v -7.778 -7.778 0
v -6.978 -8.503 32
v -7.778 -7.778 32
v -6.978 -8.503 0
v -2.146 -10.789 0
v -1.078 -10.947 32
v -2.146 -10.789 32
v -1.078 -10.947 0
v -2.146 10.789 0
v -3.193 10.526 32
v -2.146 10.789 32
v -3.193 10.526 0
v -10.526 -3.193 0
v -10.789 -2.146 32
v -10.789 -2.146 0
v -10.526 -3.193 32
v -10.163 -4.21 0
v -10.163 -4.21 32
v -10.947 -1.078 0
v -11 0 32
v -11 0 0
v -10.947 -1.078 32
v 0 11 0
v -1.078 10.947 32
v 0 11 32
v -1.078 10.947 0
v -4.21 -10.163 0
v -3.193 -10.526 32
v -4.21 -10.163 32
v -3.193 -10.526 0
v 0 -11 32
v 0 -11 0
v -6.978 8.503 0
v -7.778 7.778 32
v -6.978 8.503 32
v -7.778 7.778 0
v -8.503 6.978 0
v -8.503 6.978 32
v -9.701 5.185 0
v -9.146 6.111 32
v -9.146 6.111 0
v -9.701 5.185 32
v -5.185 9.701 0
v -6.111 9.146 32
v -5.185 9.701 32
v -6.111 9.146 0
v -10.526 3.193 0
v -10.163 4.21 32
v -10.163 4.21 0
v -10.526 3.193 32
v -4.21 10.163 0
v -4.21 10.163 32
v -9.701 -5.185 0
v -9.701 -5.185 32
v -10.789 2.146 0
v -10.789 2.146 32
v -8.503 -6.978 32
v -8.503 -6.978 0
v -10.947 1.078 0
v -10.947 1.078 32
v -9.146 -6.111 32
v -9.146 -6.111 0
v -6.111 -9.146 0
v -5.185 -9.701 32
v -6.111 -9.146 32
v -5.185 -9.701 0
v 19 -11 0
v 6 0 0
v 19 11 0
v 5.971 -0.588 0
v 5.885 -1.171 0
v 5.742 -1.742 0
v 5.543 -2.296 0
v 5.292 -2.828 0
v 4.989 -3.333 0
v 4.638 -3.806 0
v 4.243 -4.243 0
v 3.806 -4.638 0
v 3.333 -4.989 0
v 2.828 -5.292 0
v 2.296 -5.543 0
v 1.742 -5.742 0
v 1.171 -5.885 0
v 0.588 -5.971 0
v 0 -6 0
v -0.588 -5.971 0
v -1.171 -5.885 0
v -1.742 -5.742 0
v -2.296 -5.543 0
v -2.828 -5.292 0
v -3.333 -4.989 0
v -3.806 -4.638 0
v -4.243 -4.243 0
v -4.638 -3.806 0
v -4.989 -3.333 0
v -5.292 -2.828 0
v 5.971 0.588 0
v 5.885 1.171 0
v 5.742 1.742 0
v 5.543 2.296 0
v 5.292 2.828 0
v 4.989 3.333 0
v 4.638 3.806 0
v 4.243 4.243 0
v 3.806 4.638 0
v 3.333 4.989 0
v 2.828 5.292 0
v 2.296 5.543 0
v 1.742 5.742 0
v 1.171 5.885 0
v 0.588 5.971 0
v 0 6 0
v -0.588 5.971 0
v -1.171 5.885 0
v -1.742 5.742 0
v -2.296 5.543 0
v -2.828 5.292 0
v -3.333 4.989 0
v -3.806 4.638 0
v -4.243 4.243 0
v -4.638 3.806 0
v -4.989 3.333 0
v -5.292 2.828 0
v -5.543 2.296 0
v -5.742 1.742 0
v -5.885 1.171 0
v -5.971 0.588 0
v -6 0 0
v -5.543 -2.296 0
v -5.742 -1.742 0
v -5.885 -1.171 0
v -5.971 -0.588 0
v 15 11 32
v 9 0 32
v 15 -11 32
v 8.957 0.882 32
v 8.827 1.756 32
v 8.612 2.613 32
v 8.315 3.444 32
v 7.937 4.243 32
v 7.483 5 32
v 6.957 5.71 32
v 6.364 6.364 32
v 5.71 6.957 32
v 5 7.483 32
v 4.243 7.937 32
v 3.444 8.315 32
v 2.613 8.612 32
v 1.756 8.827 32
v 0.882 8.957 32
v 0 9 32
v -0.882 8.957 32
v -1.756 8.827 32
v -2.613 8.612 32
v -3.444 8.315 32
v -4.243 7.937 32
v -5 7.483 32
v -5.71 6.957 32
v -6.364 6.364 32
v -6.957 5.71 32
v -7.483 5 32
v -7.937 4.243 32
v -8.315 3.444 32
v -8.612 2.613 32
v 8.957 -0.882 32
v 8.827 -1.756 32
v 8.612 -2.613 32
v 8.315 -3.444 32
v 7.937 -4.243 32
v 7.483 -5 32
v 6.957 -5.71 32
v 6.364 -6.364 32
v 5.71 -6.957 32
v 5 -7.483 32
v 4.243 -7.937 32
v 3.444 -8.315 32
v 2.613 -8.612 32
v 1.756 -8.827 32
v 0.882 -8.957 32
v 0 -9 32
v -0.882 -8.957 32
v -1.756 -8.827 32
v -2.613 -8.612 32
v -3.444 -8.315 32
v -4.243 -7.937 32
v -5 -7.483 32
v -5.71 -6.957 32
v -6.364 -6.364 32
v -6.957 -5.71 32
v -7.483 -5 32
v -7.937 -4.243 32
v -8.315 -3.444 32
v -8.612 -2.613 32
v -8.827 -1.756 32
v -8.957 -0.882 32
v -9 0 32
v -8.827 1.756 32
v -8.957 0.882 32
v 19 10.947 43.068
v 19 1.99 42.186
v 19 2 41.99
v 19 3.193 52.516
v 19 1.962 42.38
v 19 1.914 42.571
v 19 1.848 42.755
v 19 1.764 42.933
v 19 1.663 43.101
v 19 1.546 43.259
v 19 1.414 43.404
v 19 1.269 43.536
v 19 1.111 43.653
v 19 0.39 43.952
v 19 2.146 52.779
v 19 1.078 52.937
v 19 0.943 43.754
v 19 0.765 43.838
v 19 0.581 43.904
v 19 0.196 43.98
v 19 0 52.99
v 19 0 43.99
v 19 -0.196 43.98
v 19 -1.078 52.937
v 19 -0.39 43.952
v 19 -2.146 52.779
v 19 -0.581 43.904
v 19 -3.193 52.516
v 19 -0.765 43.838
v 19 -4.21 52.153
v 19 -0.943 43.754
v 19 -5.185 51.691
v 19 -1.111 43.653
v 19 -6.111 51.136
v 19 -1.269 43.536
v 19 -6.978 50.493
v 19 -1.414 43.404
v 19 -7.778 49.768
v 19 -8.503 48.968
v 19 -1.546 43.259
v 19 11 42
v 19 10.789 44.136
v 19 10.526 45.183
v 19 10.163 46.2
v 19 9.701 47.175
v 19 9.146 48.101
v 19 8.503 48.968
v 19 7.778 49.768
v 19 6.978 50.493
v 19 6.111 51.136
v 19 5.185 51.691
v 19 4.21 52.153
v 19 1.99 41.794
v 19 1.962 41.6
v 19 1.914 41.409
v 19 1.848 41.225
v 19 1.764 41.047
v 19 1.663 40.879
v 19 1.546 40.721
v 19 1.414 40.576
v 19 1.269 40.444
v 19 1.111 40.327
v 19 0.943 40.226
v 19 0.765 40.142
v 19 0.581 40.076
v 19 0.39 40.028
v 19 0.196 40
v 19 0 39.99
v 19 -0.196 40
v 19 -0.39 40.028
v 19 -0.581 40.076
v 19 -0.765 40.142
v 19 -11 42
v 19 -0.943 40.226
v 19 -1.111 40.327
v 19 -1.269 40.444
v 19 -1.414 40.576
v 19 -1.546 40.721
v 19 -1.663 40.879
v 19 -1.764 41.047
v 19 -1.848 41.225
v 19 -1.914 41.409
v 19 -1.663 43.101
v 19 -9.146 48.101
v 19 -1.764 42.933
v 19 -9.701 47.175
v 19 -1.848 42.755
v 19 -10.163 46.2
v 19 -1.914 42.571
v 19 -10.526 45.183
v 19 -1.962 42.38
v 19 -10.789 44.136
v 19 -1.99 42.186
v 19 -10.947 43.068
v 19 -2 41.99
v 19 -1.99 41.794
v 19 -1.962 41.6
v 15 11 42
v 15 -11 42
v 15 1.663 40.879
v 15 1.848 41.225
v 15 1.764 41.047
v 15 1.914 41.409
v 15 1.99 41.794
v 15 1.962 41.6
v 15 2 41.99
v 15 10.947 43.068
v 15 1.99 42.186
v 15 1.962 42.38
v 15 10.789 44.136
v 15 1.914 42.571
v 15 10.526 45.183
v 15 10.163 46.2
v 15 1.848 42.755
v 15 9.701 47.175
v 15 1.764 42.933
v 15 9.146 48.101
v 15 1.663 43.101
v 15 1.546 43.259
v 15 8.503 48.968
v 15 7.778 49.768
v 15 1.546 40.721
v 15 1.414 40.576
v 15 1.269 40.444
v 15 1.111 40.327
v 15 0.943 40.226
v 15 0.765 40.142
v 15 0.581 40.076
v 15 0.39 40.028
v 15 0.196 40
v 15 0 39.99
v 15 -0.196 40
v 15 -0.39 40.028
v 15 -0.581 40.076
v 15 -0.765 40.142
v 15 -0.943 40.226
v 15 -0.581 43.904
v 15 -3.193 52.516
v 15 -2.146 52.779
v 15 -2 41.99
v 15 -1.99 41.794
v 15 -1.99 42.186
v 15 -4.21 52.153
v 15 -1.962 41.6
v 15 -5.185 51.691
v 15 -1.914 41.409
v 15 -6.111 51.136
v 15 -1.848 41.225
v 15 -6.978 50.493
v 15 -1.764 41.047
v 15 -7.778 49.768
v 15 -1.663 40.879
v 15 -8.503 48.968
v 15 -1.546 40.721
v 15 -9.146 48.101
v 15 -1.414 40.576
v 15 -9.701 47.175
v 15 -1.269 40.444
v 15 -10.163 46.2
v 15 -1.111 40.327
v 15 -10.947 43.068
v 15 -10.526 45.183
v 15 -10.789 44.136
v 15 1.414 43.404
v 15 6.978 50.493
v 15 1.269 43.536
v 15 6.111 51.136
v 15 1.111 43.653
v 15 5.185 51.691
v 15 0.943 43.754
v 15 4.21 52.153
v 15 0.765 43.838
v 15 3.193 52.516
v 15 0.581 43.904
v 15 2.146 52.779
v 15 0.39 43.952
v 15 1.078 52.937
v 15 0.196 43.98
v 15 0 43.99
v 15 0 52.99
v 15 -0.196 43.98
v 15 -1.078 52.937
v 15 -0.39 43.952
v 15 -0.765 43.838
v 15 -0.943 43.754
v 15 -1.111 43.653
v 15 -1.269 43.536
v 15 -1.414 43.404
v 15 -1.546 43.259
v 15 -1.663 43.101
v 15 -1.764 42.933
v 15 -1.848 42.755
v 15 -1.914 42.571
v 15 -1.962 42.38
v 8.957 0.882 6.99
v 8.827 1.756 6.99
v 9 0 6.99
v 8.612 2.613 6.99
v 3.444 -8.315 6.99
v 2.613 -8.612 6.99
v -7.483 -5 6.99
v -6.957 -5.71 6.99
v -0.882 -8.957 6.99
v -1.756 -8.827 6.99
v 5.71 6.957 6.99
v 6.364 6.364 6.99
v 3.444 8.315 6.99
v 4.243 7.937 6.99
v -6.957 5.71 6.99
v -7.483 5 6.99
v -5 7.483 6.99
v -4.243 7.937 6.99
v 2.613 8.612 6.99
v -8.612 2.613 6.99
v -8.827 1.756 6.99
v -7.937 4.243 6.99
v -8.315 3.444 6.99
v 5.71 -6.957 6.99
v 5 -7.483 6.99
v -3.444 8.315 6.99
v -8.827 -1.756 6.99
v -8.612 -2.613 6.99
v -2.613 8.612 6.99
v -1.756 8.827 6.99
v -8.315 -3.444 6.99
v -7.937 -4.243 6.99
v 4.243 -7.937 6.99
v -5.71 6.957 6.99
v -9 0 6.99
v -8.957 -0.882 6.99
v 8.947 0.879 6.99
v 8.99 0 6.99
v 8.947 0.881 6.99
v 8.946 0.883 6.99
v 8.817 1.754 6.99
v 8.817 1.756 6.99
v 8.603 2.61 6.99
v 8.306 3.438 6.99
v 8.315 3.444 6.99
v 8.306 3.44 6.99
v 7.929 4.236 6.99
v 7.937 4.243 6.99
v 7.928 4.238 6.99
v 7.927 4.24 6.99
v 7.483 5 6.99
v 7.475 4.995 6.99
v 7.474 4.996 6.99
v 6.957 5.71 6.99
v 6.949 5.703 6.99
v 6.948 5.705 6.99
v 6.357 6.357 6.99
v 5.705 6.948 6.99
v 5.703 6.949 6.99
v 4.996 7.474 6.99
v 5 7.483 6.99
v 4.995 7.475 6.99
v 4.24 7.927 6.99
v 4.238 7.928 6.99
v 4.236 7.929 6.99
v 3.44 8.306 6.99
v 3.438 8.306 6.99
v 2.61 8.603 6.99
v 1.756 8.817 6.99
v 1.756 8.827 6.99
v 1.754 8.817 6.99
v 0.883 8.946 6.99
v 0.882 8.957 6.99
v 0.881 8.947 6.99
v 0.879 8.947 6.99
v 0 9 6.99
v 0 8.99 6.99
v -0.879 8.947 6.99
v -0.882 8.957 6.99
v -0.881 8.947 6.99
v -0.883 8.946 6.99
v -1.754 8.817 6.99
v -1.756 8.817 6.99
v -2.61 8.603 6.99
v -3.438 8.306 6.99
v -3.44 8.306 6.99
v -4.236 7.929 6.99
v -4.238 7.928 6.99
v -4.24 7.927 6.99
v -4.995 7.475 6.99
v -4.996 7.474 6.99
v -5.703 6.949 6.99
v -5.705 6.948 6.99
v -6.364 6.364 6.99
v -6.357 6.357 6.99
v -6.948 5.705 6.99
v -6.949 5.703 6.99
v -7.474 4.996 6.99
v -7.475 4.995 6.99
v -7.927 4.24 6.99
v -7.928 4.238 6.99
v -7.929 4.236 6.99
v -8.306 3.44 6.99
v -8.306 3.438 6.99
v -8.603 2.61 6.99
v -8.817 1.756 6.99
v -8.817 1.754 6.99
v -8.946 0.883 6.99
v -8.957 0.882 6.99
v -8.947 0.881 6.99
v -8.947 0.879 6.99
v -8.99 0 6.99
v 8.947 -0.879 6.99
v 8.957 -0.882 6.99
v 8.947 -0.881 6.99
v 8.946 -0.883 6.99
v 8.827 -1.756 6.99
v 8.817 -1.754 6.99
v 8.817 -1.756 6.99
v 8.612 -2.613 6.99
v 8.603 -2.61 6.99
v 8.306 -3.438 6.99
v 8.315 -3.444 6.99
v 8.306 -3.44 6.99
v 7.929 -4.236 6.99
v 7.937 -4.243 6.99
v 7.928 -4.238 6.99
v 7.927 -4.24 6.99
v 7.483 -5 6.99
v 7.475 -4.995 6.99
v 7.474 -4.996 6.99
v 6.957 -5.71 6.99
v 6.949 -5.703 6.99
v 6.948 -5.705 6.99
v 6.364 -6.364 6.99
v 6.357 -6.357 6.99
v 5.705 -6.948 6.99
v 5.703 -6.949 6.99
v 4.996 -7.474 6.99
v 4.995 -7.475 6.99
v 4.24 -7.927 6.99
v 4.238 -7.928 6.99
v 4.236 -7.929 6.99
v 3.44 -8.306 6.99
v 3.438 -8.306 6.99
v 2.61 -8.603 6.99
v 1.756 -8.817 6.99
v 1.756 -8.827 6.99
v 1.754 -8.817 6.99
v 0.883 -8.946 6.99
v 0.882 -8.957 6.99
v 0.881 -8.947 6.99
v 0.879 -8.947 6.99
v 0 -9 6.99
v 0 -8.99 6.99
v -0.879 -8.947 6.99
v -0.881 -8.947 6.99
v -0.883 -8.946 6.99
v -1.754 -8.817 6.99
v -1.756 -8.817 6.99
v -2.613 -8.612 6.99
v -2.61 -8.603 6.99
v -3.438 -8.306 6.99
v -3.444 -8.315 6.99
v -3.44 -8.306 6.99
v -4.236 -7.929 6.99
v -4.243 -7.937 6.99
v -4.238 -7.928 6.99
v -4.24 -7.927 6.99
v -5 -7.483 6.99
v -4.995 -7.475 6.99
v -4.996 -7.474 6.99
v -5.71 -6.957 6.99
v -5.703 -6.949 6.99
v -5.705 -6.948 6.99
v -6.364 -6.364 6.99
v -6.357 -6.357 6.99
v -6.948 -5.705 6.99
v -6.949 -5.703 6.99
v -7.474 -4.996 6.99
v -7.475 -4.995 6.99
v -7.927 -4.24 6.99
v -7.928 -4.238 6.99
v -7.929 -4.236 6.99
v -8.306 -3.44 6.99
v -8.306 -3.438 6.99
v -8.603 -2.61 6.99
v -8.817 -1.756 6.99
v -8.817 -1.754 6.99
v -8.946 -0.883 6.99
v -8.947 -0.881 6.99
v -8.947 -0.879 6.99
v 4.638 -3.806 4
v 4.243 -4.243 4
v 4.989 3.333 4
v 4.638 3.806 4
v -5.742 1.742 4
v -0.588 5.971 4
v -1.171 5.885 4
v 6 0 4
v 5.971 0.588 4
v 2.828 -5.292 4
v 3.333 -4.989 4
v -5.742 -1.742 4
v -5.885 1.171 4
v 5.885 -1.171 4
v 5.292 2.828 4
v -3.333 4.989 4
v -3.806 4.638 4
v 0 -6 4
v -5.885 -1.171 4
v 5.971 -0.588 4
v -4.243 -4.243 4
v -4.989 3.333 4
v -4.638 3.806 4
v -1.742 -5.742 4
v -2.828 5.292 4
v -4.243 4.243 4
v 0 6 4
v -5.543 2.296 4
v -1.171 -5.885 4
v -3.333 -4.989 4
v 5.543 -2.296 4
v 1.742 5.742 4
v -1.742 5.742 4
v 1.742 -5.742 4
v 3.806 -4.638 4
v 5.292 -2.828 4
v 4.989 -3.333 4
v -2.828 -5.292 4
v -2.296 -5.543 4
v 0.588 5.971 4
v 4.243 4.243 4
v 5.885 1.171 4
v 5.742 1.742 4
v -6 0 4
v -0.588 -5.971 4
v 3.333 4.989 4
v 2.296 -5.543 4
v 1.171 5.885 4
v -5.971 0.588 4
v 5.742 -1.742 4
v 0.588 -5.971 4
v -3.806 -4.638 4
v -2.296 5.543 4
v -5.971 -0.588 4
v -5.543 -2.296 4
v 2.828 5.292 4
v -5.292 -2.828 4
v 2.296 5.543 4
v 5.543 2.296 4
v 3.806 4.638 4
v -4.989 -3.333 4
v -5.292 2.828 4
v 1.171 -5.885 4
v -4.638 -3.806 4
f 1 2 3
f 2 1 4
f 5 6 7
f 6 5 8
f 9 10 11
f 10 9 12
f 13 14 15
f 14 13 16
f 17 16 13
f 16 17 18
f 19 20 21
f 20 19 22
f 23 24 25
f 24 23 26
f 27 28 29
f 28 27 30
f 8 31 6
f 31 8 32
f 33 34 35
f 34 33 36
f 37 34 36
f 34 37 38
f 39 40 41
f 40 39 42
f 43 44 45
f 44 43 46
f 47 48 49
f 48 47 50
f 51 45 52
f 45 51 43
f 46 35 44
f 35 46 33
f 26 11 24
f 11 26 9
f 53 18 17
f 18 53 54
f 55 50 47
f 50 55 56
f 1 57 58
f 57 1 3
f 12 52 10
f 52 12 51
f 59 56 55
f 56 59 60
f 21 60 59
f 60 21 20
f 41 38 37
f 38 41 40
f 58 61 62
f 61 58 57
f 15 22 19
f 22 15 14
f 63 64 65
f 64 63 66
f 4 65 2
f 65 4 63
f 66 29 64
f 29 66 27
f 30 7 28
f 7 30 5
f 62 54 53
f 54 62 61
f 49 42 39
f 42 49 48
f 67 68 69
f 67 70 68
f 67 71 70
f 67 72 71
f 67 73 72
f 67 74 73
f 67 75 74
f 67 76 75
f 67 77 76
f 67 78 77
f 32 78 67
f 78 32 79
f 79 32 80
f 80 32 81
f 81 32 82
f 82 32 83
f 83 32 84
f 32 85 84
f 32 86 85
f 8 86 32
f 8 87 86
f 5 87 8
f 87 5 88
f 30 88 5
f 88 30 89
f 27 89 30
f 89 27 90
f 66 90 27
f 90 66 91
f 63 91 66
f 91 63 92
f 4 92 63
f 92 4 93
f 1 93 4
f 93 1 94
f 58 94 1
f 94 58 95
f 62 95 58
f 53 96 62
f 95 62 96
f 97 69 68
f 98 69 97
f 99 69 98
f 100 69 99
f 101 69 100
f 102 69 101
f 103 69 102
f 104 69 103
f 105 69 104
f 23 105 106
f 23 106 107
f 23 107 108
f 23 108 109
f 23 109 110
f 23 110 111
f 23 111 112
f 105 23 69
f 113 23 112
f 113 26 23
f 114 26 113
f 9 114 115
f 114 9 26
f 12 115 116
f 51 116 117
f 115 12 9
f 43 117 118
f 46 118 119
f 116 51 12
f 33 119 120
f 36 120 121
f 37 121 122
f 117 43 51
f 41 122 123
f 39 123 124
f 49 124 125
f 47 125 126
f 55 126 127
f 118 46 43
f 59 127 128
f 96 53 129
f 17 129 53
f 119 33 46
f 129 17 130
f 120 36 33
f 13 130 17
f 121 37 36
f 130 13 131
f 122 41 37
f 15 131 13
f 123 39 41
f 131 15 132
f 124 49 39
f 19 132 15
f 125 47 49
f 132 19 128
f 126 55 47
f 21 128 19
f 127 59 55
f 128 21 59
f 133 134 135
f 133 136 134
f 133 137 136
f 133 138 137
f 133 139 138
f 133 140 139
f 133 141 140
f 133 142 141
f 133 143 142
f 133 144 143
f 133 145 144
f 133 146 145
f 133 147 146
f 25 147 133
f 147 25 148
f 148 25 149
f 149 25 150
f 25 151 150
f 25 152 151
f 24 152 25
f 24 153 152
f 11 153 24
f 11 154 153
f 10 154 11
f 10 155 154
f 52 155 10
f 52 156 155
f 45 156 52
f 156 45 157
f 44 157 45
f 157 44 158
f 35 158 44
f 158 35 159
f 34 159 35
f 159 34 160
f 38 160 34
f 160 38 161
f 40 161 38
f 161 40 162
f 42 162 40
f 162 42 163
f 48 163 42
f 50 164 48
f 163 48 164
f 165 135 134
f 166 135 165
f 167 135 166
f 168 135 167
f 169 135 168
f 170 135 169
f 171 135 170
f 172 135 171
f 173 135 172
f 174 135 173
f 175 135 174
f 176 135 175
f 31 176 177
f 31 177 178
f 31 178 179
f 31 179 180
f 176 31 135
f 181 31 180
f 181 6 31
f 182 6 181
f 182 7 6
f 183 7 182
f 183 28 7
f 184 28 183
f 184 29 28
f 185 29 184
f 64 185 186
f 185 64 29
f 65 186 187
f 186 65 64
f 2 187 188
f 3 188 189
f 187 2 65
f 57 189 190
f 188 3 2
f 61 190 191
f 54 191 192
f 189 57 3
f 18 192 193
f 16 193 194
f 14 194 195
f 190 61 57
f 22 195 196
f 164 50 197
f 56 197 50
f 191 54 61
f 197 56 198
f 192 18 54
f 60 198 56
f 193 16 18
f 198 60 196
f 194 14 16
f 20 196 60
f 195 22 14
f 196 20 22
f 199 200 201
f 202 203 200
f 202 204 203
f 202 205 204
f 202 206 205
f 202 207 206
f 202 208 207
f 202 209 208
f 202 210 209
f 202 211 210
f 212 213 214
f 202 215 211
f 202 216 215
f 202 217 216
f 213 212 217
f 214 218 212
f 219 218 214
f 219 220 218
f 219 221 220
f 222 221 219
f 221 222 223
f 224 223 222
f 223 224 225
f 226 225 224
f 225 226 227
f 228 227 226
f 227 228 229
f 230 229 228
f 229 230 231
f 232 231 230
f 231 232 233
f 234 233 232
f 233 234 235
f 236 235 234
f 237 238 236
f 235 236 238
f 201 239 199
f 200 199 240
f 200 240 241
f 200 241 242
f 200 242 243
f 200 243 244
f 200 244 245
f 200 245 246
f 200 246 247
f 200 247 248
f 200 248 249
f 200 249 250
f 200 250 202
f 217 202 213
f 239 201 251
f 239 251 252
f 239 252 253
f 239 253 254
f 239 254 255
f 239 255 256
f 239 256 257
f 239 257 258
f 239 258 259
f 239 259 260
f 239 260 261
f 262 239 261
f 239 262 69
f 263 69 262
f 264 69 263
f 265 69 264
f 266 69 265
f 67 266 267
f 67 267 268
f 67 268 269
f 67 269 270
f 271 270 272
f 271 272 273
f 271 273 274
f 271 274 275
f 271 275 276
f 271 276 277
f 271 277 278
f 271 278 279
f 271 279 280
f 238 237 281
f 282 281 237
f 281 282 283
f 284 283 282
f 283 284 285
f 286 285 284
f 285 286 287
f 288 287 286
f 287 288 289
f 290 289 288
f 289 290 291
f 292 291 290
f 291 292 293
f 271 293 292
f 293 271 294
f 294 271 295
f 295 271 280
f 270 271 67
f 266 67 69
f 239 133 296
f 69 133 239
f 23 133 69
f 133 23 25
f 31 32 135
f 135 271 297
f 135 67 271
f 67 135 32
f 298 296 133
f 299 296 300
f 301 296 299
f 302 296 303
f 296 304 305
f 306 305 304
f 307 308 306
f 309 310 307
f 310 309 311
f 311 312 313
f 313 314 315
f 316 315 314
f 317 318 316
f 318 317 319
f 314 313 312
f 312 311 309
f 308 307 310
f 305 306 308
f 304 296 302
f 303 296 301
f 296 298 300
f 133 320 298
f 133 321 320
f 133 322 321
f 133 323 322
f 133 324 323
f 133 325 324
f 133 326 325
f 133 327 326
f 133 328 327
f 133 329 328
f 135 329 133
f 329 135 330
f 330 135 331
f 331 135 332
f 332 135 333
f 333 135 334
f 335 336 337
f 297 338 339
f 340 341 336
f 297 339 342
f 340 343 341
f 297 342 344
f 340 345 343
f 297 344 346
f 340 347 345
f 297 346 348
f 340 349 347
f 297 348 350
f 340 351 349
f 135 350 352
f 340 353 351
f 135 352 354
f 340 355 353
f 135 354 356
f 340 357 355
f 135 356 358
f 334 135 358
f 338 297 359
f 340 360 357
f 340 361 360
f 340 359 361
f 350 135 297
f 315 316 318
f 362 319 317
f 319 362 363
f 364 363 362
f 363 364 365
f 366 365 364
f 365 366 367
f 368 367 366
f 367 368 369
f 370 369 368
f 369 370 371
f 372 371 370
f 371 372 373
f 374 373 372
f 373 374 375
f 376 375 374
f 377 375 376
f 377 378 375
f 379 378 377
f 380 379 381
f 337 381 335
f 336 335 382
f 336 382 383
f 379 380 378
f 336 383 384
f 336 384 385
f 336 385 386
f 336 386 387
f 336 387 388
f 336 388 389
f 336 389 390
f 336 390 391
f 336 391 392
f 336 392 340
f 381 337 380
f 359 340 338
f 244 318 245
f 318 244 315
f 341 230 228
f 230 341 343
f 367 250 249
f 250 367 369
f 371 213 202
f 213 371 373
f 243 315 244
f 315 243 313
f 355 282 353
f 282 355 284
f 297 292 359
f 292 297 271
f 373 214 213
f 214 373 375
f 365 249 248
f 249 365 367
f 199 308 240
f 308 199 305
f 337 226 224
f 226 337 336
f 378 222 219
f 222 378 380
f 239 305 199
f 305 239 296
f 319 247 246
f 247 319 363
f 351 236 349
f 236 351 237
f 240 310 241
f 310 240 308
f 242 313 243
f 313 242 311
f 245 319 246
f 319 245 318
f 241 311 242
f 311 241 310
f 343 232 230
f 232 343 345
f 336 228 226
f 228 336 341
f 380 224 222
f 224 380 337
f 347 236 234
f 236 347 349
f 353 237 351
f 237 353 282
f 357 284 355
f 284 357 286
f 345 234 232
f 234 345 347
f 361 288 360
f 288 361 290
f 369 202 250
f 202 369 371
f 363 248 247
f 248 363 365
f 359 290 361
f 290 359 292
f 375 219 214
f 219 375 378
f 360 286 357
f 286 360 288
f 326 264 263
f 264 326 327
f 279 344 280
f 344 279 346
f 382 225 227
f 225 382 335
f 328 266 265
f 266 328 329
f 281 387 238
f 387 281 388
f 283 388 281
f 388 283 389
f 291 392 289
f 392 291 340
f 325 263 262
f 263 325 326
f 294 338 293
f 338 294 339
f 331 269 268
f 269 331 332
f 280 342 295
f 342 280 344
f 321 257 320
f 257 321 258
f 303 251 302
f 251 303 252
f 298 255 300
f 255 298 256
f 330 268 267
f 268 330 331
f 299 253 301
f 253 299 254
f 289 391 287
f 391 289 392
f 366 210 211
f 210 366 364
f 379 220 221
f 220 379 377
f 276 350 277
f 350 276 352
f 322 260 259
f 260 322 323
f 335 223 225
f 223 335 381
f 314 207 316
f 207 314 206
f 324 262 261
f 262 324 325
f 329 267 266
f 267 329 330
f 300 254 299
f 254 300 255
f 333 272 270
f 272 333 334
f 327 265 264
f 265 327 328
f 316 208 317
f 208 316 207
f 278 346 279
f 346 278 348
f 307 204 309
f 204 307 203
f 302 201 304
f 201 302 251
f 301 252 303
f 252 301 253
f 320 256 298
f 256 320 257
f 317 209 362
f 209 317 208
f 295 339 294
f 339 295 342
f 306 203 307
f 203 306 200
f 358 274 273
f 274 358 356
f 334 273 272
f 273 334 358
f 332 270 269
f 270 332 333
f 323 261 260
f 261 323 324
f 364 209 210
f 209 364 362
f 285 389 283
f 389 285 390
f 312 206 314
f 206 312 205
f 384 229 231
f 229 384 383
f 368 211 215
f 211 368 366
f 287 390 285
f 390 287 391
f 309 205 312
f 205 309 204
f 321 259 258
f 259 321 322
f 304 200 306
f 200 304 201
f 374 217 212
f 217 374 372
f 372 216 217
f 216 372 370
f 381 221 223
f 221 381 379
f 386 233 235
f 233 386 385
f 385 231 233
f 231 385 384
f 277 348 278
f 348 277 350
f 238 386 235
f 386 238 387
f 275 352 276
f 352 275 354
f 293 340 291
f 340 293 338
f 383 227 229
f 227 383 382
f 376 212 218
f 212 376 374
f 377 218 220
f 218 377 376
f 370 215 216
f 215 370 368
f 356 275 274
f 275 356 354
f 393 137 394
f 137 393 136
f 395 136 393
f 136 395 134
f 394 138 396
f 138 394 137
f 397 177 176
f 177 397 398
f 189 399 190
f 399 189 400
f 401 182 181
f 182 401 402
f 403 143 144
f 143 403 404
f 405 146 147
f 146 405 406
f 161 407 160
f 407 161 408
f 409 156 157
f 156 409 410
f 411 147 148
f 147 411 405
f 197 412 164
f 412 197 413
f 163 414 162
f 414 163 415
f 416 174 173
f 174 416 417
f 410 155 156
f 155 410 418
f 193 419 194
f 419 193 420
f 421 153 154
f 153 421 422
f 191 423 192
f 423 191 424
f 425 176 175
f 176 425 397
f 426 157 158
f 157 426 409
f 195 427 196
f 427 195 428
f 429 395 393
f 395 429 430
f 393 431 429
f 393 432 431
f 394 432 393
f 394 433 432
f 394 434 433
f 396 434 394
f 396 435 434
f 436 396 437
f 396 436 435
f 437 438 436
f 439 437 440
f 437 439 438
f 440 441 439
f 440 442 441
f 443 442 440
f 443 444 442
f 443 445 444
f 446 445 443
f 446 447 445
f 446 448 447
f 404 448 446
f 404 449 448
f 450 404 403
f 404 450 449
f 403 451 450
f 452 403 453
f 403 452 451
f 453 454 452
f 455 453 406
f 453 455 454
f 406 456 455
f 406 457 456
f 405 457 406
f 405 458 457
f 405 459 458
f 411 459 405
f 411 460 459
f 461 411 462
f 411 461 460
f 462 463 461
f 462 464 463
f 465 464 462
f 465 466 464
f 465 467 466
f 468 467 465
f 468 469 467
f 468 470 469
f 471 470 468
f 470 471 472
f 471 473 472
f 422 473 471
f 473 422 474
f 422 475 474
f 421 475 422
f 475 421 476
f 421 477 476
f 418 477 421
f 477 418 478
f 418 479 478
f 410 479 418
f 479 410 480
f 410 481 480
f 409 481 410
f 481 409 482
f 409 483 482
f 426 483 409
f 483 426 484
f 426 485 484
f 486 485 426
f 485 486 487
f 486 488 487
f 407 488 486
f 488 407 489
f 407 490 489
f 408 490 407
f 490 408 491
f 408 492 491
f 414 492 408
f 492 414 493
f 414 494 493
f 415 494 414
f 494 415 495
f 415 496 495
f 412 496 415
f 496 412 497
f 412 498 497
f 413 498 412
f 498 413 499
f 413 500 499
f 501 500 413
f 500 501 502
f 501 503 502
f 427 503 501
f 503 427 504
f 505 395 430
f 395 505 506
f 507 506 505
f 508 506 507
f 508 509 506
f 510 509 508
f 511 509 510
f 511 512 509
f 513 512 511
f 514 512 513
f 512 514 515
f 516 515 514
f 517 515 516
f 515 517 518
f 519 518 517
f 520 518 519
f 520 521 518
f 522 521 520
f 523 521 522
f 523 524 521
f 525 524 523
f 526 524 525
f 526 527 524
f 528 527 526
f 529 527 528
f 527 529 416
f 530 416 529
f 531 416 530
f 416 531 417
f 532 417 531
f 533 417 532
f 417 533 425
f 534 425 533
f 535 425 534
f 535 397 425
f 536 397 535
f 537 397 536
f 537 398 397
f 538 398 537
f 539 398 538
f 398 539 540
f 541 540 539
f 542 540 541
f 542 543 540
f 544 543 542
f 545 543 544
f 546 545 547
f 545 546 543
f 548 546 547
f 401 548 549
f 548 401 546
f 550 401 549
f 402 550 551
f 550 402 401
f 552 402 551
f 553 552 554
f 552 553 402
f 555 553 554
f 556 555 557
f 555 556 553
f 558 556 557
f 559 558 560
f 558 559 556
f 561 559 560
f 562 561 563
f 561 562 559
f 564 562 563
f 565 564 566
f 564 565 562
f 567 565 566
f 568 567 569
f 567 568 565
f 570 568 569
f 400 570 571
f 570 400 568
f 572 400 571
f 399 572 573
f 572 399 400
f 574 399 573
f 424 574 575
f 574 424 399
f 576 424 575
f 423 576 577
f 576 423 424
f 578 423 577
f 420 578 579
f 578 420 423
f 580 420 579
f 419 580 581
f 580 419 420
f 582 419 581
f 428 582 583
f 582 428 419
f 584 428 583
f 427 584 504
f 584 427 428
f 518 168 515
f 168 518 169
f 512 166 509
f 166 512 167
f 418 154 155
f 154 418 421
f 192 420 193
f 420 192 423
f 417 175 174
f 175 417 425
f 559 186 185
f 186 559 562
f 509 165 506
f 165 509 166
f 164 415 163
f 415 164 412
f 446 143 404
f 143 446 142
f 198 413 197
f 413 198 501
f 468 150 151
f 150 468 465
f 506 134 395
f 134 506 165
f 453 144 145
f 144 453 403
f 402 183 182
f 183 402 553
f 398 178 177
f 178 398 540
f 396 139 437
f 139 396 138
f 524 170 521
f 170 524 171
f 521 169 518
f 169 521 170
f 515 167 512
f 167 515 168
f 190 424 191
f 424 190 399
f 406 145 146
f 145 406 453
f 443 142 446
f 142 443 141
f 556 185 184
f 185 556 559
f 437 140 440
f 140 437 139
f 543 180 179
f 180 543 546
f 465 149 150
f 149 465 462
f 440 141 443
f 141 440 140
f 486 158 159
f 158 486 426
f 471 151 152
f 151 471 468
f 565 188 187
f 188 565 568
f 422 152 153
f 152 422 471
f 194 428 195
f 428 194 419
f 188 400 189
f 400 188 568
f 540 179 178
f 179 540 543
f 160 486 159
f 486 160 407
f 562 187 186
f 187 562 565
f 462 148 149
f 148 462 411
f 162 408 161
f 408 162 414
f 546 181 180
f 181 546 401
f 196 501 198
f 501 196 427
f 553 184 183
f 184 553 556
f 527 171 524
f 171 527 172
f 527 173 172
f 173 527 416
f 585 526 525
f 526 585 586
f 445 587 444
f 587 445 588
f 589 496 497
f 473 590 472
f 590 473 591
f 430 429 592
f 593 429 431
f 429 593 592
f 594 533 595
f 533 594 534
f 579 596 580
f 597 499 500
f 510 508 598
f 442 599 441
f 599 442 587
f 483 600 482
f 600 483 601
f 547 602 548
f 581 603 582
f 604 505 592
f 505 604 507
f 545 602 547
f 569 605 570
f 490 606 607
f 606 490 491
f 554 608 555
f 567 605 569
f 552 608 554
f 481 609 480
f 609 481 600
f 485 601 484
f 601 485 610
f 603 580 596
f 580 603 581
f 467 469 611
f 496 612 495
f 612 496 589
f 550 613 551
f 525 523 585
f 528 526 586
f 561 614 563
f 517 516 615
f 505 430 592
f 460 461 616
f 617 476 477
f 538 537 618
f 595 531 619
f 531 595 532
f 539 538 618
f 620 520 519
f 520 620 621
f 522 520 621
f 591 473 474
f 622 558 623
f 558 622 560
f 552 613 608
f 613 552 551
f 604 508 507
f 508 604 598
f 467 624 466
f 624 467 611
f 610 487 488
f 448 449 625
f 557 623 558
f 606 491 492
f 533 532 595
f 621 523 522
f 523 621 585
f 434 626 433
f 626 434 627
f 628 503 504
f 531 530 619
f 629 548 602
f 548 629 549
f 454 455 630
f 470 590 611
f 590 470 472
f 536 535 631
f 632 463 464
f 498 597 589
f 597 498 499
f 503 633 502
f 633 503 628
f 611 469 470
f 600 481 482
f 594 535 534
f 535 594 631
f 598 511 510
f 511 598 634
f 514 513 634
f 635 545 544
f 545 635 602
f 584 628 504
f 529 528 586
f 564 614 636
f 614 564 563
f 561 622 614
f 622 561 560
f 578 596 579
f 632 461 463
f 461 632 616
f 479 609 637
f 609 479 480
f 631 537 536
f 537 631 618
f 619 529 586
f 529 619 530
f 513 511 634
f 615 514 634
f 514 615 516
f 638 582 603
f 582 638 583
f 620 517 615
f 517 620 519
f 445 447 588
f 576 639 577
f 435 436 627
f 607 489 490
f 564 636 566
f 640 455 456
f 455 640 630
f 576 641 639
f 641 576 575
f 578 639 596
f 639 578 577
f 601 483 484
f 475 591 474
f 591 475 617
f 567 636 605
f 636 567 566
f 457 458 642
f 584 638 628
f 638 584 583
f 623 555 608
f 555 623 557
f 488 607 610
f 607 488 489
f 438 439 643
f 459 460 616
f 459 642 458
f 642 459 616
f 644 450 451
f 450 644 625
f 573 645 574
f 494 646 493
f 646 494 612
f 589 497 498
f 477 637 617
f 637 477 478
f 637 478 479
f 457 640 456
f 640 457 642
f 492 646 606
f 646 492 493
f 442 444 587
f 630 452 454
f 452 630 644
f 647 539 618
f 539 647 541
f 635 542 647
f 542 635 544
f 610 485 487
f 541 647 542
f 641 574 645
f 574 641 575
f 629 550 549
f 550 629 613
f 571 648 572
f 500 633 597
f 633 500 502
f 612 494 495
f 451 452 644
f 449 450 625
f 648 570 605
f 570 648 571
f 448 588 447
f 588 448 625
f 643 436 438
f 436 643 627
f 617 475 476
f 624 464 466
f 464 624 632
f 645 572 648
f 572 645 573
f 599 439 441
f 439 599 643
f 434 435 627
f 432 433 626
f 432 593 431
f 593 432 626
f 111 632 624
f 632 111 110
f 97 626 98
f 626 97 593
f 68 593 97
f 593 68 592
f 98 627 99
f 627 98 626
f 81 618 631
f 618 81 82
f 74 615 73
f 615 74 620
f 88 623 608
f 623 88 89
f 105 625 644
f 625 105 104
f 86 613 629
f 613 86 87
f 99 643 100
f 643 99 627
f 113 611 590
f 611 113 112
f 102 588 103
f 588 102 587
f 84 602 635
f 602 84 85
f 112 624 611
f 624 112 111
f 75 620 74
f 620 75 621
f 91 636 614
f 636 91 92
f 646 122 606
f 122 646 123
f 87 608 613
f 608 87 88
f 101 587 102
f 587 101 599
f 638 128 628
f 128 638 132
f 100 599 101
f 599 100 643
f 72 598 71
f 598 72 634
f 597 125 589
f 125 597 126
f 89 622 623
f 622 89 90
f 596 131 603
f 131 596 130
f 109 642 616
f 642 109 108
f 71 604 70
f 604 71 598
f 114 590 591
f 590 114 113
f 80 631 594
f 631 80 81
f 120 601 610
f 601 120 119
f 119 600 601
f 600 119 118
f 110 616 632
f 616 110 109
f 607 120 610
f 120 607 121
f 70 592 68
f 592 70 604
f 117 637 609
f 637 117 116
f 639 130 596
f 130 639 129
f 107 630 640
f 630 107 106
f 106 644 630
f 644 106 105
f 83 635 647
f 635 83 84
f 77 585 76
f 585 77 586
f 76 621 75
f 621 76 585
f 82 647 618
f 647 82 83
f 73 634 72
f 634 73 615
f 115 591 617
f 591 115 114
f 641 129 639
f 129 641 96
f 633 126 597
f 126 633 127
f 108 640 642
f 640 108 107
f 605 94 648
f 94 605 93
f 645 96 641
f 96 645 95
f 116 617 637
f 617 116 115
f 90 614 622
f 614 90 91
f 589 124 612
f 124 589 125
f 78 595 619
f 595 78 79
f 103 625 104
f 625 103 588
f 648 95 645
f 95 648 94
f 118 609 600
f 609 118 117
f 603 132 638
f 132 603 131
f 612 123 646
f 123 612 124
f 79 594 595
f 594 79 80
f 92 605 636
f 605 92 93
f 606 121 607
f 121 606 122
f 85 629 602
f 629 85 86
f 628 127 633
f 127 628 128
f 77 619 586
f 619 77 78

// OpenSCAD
//
// holder for the Bluelab pH probe cap while probe is in use
//

eps = 0.01;
$fn = 64;

difference() {
    union() {
        cylinder( r = 11, h = 32 );

        translate( [ 0, -11, 0 ] ) {
            cube( [ 19, 22, 32 ] );
        }

        translate( [ 15, -11, 32-eps ] ) {
            cube( [ 4, 22, 10+eps ] );
        }

        translate( [ 15, 0, 32 + 10 -eps ] )
        rotate( [ 0, 90, 0 ] ) {
            cylinder( r = 11, h = 4 );
        }
    }

// hole for screw

    translate( [ 15-eps, 0, 32 + 10 -eps ] )
    rotate( [ 0, 90, 0 ] ) {
        cylinder( r = 2, h = 4 + 2*eps );
    }

// through-hole for the cap, and outlet for liquid

    translate( [ 0, 0, 7-eps ] ) {
        cylinder( r = 9, h = 25 + 2*eps );
    }

    translate( [ 0, 0, 4 ] ) {
        cylinder( r1 = 6, r2 = 9, h=3 );
    }

    translate( [ 0, 0, -eps ] ) {
        cylinder( r = 6, h = 4 + 2*eps );
    }
}
